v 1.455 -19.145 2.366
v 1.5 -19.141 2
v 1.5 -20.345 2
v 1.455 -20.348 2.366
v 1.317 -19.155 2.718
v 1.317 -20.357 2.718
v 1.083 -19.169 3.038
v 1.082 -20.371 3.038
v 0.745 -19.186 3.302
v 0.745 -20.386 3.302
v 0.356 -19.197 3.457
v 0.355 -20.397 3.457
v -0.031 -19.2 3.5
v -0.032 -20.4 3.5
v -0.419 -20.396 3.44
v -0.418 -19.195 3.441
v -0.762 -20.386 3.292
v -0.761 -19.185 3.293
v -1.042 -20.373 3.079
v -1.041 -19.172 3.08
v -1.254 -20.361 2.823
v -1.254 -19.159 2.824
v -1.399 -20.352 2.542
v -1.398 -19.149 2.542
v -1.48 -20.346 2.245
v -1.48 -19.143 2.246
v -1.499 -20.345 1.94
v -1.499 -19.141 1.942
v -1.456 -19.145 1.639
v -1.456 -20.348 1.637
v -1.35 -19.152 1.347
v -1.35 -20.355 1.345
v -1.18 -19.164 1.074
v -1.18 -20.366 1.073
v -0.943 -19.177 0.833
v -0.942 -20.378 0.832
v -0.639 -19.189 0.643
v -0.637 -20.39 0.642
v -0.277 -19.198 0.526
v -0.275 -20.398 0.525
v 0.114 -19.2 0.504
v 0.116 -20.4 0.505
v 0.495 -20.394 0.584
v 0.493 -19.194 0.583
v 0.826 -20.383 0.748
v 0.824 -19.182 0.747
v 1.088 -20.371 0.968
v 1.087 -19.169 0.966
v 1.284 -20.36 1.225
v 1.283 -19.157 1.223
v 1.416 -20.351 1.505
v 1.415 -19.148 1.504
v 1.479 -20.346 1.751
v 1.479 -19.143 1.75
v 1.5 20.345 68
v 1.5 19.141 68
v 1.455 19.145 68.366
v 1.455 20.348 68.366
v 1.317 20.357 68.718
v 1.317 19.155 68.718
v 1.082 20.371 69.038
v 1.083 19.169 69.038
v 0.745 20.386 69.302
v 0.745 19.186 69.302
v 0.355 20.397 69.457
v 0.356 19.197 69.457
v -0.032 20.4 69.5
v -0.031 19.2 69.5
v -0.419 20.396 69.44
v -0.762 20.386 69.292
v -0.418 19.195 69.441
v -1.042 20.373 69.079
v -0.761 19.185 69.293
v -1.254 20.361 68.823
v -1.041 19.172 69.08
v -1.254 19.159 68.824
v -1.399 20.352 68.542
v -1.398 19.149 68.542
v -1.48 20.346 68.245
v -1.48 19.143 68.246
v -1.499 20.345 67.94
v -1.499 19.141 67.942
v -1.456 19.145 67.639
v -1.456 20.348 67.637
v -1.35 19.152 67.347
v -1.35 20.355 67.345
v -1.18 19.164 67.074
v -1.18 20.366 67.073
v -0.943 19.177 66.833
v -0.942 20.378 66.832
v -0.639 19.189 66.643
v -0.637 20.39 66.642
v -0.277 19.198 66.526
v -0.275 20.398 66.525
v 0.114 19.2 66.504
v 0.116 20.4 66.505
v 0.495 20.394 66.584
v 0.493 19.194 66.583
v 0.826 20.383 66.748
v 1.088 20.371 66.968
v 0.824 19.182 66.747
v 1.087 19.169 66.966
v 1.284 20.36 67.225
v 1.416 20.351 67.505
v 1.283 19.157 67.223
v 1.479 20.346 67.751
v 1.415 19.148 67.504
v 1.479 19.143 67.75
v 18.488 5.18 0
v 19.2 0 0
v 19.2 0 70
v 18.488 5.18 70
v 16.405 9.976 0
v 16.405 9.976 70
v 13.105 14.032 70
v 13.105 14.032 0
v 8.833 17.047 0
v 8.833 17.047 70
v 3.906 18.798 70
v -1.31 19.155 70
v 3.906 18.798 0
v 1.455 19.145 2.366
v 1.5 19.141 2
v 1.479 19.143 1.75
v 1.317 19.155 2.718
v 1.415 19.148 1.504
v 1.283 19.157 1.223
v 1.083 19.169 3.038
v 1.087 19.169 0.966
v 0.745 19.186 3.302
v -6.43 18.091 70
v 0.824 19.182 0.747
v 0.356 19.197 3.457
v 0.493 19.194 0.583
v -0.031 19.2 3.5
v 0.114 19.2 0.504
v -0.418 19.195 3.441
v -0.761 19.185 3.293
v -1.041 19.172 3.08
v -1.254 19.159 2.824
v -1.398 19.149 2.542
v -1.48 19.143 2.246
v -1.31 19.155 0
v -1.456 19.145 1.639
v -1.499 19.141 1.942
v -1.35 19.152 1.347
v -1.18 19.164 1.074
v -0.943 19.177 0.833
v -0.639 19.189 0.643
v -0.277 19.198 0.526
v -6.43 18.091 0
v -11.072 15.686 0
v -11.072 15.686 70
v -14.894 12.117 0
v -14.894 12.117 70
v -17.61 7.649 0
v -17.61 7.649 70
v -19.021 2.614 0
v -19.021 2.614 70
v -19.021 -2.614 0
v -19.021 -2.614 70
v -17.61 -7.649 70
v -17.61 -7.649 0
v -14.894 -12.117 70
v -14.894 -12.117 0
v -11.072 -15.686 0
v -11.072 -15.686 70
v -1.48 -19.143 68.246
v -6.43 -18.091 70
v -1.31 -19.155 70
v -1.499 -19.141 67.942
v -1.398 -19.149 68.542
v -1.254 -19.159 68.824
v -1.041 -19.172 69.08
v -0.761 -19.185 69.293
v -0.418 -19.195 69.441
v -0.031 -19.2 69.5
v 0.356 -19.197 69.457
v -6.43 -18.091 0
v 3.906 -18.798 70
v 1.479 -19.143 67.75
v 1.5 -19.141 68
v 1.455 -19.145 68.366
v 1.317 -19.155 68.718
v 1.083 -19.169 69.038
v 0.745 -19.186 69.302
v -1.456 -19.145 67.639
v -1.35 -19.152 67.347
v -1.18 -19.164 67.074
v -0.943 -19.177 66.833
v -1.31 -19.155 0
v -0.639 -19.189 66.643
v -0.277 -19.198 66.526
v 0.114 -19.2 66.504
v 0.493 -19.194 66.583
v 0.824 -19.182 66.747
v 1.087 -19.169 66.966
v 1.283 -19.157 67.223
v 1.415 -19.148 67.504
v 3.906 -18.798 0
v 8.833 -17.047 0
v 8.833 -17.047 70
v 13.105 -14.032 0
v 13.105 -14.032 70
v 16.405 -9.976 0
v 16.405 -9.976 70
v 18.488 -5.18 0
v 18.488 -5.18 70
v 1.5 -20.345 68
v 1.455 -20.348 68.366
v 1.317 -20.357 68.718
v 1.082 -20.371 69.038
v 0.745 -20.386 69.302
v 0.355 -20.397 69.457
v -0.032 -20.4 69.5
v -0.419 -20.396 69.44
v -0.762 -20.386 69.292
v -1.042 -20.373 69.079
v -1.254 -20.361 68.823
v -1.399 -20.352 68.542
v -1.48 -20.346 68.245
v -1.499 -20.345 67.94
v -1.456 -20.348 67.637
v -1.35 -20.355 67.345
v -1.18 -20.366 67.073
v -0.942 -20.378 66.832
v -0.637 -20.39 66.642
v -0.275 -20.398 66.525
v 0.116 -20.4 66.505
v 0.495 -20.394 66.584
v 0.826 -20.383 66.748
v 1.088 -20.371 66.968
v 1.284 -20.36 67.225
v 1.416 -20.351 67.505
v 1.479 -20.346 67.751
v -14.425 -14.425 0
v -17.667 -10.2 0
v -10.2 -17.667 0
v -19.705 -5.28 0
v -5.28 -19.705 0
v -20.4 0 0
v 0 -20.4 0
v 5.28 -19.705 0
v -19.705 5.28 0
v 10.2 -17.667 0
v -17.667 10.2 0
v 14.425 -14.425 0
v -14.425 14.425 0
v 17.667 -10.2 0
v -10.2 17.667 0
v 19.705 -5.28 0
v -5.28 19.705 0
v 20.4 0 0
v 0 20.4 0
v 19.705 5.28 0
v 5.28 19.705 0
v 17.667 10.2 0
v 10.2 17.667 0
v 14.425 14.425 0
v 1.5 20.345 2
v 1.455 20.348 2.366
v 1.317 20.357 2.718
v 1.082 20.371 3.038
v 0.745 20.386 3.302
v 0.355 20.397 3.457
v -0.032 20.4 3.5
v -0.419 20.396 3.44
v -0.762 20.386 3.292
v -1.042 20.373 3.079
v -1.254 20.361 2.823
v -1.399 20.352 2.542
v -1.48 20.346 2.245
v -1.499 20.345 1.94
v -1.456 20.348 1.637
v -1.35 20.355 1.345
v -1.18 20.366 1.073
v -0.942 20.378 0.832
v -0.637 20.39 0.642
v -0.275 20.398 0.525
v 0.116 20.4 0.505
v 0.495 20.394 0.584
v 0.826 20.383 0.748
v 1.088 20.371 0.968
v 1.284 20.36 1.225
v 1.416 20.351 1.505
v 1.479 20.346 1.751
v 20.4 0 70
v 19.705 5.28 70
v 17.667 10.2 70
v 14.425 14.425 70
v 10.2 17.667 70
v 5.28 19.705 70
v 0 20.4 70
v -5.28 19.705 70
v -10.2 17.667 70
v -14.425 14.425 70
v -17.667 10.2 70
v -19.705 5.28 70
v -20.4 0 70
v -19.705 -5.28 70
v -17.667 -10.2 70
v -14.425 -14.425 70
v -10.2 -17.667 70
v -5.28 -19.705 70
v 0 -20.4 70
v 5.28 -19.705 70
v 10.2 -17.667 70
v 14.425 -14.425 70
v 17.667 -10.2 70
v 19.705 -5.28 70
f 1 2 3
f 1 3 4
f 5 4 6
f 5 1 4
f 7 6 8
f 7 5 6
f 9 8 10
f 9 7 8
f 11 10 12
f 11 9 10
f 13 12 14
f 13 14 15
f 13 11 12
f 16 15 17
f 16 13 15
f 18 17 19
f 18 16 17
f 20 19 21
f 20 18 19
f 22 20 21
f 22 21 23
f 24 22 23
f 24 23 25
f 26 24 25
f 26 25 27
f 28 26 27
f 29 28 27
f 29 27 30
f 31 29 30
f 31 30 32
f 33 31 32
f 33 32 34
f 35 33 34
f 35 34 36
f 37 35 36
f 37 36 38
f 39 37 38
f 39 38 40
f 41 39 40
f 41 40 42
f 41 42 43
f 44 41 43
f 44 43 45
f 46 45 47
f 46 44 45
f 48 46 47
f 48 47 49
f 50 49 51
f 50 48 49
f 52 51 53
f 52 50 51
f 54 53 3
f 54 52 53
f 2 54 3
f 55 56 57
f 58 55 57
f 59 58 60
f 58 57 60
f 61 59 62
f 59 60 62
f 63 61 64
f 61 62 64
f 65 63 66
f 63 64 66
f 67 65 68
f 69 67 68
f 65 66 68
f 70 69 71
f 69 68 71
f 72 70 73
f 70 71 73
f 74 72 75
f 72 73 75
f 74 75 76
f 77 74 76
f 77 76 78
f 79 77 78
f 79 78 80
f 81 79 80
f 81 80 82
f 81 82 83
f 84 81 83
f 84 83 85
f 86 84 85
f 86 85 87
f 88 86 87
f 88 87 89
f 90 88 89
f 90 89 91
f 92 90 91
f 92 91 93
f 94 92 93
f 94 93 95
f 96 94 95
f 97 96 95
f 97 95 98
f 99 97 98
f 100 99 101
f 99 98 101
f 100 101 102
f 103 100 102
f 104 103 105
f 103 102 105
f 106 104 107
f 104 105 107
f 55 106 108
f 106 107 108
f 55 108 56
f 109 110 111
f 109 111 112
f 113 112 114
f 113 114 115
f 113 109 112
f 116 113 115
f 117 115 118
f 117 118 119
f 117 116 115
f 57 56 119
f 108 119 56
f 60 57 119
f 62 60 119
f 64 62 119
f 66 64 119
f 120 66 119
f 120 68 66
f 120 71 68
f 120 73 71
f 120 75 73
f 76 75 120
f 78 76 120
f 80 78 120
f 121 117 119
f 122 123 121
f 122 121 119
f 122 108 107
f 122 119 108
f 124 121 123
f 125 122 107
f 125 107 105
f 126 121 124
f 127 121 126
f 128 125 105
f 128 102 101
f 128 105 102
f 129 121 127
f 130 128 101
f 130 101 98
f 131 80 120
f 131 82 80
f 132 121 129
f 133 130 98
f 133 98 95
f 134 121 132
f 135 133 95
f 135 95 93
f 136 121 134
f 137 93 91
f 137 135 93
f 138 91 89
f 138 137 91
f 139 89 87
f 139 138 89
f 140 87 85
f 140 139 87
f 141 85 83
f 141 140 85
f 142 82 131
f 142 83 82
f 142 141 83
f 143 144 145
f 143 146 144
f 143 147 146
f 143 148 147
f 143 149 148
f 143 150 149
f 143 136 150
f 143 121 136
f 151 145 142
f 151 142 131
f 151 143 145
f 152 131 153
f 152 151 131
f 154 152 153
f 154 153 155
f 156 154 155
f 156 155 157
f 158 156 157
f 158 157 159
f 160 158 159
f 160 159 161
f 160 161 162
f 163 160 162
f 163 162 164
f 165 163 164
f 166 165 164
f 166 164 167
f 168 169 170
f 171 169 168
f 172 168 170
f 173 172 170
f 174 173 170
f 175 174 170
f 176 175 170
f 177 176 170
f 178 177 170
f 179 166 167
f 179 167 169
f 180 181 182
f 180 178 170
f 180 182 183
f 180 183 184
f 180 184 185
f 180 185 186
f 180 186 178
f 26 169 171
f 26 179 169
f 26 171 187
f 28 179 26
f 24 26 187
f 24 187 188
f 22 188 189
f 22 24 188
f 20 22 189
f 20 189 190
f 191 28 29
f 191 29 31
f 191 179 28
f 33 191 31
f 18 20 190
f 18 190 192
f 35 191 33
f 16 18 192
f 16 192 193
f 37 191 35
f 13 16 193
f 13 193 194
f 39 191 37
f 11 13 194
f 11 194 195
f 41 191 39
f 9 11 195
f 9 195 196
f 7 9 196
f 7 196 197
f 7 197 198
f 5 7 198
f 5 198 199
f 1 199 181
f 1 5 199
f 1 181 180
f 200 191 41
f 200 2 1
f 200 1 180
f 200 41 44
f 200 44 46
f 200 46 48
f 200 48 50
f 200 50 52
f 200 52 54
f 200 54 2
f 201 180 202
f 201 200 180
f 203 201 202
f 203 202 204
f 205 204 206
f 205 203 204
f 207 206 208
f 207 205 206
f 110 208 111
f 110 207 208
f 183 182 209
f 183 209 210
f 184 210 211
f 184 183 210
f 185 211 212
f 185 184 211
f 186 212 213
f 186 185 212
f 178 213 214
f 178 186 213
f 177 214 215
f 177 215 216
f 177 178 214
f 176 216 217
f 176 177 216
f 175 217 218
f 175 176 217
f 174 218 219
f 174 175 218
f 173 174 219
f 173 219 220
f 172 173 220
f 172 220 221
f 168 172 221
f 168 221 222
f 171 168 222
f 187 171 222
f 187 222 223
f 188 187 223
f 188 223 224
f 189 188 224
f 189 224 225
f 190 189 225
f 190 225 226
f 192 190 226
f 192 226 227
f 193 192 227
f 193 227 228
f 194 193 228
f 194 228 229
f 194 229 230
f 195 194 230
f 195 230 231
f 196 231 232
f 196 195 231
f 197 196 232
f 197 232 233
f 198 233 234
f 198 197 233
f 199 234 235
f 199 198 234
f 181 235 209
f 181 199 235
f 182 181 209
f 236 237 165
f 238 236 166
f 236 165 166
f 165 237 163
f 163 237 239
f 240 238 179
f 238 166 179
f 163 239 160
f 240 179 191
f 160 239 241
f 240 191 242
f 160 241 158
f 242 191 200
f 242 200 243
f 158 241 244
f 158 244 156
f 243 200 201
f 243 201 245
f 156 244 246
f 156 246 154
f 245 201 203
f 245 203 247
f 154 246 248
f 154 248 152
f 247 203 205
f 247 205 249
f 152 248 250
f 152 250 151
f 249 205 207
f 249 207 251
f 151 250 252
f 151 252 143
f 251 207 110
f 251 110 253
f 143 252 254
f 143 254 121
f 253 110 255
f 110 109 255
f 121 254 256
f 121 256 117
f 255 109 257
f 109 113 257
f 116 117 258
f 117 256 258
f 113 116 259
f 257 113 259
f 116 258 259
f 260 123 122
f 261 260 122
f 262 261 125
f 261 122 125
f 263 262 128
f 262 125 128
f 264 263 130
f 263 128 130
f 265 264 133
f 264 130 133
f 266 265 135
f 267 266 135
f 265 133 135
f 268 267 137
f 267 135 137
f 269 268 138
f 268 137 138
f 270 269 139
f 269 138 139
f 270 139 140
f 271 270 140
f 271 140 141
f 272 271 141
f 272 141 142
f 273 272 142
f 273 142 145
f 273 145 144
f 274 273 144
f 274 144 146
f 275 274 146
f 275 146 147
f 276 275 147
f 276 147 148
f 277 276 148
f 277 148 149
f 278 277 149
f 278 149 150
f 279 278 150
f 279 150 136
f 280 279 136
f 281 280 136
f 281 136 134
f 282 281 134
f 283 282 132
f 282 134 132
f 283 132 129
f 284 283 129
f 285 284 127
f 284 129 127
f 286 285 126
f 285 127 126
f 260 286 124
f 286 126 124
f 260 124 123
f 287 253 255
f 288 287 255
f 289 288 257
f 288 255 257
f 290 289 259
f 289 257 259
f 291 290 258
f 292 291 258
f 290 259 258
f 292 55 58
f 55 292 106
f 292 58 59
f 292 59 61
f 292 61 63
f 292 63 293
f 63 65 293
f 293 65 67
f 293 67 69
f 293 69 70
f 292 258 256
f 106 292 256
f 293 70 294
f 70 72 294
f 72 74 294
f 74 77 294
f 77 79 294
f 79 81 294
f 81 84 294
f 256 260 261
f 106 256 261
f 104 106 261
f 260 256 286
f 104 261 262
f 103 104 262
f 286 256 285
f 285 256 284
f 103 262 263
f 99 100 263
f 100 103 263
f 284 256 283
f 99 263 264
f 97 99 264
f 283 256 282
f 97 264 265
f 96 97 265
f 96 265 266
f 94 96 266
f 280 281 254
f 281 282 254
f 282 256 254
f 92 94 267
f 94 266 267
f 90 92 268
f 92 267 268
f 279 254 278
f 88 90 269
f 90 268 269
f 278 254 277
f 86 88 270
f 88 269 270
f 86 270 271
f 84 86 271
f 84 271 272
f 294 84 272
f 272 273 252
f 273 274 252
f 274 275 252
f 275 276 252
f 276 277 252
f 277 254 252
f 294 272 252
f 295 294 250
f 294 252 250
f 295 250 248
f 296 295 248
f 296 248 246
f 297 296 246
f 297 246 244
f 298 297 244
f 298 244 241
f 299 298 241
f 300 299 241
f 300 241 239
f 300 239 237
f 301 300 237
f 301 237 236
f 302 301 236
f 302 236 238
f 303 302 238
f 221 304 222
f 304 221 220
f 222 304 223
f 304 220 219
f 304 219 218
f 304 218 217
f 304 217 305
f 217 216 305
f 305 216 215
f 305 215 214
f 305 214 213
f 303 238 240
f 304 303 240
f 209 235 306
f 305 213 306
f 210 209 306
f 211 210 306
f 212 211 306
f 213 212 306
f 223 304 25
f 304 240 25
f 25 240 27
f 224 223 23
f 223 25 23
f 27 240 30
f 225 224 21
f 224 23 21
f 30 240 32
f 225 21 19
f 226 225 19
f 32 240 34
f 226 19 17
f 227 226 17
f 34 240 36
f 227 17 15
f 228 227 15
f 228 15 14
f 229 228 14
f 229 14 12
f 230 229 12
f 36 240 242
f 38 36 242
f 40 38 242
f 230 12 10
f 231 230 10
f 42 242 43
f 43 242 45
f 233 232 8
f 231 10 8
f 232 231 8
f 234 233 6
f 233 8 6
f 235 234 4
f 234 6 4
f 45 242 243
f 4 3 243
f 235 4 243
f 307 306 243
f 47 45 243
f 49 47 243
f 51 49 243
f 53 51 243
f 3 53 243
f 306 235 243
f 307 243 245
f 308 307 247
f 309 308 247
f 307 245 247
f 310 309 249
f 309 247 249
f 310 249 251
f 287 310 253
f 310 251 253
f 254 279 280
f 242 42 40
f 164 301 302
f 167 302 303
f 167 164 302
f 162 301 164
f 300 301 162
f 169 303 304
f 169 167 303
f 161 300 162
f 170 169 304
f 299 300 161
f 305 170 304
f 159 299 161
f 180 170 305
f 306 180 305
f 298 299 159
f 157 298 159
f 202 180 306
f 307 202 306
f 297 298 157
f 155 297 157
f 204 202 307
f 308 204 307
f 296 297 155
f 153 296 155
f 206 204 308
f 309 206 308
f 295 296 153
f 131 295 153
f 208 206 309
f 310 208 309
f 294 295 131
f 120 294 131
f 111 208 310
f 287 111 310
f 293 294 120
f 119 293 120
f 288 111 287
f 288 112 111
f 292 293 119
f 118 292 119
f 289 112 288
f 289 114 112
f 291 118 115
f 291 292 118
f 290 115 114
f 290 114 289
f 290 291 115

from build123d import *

# Parameters (mm, degrees)
SKETCH_R          = 20.4
SKETCH_R_2        = 19.2
PAD_DEPTH         = 70
SKETCH001_R       = 1.5
POCKET_DEPTH      = 20.401
POCKET_DEPTH_BACK = -20.401


with BuildPart() as part:
    # Sketch → Pad (new body)
    with BuildSketch(Plane.XY):
        Circle(SKETCH_R)
        Circle(SKETCH_R_2, mode=Mode.SUBTRACT)
    extrude(amount=PAD_DEPTH)

    # Sketch001 → Pocket (cut, two sides)
    with BuildSketch(Plane.XZ) as pocket_sk:
        with Locations((0, 2)):
            Circle(SKETCH001_R)
        with Locations((0, 68)):
            Circle(SKETCH001_R)
    extrude(amount=-POCKET_DEPTH, mode=Mode.SUBTRACT)
    extrude(pocket_sk.sketch, amount=-POCKET_DEPTH_BACK, mode=Mode.SUBTRACT)


solid = part.part
